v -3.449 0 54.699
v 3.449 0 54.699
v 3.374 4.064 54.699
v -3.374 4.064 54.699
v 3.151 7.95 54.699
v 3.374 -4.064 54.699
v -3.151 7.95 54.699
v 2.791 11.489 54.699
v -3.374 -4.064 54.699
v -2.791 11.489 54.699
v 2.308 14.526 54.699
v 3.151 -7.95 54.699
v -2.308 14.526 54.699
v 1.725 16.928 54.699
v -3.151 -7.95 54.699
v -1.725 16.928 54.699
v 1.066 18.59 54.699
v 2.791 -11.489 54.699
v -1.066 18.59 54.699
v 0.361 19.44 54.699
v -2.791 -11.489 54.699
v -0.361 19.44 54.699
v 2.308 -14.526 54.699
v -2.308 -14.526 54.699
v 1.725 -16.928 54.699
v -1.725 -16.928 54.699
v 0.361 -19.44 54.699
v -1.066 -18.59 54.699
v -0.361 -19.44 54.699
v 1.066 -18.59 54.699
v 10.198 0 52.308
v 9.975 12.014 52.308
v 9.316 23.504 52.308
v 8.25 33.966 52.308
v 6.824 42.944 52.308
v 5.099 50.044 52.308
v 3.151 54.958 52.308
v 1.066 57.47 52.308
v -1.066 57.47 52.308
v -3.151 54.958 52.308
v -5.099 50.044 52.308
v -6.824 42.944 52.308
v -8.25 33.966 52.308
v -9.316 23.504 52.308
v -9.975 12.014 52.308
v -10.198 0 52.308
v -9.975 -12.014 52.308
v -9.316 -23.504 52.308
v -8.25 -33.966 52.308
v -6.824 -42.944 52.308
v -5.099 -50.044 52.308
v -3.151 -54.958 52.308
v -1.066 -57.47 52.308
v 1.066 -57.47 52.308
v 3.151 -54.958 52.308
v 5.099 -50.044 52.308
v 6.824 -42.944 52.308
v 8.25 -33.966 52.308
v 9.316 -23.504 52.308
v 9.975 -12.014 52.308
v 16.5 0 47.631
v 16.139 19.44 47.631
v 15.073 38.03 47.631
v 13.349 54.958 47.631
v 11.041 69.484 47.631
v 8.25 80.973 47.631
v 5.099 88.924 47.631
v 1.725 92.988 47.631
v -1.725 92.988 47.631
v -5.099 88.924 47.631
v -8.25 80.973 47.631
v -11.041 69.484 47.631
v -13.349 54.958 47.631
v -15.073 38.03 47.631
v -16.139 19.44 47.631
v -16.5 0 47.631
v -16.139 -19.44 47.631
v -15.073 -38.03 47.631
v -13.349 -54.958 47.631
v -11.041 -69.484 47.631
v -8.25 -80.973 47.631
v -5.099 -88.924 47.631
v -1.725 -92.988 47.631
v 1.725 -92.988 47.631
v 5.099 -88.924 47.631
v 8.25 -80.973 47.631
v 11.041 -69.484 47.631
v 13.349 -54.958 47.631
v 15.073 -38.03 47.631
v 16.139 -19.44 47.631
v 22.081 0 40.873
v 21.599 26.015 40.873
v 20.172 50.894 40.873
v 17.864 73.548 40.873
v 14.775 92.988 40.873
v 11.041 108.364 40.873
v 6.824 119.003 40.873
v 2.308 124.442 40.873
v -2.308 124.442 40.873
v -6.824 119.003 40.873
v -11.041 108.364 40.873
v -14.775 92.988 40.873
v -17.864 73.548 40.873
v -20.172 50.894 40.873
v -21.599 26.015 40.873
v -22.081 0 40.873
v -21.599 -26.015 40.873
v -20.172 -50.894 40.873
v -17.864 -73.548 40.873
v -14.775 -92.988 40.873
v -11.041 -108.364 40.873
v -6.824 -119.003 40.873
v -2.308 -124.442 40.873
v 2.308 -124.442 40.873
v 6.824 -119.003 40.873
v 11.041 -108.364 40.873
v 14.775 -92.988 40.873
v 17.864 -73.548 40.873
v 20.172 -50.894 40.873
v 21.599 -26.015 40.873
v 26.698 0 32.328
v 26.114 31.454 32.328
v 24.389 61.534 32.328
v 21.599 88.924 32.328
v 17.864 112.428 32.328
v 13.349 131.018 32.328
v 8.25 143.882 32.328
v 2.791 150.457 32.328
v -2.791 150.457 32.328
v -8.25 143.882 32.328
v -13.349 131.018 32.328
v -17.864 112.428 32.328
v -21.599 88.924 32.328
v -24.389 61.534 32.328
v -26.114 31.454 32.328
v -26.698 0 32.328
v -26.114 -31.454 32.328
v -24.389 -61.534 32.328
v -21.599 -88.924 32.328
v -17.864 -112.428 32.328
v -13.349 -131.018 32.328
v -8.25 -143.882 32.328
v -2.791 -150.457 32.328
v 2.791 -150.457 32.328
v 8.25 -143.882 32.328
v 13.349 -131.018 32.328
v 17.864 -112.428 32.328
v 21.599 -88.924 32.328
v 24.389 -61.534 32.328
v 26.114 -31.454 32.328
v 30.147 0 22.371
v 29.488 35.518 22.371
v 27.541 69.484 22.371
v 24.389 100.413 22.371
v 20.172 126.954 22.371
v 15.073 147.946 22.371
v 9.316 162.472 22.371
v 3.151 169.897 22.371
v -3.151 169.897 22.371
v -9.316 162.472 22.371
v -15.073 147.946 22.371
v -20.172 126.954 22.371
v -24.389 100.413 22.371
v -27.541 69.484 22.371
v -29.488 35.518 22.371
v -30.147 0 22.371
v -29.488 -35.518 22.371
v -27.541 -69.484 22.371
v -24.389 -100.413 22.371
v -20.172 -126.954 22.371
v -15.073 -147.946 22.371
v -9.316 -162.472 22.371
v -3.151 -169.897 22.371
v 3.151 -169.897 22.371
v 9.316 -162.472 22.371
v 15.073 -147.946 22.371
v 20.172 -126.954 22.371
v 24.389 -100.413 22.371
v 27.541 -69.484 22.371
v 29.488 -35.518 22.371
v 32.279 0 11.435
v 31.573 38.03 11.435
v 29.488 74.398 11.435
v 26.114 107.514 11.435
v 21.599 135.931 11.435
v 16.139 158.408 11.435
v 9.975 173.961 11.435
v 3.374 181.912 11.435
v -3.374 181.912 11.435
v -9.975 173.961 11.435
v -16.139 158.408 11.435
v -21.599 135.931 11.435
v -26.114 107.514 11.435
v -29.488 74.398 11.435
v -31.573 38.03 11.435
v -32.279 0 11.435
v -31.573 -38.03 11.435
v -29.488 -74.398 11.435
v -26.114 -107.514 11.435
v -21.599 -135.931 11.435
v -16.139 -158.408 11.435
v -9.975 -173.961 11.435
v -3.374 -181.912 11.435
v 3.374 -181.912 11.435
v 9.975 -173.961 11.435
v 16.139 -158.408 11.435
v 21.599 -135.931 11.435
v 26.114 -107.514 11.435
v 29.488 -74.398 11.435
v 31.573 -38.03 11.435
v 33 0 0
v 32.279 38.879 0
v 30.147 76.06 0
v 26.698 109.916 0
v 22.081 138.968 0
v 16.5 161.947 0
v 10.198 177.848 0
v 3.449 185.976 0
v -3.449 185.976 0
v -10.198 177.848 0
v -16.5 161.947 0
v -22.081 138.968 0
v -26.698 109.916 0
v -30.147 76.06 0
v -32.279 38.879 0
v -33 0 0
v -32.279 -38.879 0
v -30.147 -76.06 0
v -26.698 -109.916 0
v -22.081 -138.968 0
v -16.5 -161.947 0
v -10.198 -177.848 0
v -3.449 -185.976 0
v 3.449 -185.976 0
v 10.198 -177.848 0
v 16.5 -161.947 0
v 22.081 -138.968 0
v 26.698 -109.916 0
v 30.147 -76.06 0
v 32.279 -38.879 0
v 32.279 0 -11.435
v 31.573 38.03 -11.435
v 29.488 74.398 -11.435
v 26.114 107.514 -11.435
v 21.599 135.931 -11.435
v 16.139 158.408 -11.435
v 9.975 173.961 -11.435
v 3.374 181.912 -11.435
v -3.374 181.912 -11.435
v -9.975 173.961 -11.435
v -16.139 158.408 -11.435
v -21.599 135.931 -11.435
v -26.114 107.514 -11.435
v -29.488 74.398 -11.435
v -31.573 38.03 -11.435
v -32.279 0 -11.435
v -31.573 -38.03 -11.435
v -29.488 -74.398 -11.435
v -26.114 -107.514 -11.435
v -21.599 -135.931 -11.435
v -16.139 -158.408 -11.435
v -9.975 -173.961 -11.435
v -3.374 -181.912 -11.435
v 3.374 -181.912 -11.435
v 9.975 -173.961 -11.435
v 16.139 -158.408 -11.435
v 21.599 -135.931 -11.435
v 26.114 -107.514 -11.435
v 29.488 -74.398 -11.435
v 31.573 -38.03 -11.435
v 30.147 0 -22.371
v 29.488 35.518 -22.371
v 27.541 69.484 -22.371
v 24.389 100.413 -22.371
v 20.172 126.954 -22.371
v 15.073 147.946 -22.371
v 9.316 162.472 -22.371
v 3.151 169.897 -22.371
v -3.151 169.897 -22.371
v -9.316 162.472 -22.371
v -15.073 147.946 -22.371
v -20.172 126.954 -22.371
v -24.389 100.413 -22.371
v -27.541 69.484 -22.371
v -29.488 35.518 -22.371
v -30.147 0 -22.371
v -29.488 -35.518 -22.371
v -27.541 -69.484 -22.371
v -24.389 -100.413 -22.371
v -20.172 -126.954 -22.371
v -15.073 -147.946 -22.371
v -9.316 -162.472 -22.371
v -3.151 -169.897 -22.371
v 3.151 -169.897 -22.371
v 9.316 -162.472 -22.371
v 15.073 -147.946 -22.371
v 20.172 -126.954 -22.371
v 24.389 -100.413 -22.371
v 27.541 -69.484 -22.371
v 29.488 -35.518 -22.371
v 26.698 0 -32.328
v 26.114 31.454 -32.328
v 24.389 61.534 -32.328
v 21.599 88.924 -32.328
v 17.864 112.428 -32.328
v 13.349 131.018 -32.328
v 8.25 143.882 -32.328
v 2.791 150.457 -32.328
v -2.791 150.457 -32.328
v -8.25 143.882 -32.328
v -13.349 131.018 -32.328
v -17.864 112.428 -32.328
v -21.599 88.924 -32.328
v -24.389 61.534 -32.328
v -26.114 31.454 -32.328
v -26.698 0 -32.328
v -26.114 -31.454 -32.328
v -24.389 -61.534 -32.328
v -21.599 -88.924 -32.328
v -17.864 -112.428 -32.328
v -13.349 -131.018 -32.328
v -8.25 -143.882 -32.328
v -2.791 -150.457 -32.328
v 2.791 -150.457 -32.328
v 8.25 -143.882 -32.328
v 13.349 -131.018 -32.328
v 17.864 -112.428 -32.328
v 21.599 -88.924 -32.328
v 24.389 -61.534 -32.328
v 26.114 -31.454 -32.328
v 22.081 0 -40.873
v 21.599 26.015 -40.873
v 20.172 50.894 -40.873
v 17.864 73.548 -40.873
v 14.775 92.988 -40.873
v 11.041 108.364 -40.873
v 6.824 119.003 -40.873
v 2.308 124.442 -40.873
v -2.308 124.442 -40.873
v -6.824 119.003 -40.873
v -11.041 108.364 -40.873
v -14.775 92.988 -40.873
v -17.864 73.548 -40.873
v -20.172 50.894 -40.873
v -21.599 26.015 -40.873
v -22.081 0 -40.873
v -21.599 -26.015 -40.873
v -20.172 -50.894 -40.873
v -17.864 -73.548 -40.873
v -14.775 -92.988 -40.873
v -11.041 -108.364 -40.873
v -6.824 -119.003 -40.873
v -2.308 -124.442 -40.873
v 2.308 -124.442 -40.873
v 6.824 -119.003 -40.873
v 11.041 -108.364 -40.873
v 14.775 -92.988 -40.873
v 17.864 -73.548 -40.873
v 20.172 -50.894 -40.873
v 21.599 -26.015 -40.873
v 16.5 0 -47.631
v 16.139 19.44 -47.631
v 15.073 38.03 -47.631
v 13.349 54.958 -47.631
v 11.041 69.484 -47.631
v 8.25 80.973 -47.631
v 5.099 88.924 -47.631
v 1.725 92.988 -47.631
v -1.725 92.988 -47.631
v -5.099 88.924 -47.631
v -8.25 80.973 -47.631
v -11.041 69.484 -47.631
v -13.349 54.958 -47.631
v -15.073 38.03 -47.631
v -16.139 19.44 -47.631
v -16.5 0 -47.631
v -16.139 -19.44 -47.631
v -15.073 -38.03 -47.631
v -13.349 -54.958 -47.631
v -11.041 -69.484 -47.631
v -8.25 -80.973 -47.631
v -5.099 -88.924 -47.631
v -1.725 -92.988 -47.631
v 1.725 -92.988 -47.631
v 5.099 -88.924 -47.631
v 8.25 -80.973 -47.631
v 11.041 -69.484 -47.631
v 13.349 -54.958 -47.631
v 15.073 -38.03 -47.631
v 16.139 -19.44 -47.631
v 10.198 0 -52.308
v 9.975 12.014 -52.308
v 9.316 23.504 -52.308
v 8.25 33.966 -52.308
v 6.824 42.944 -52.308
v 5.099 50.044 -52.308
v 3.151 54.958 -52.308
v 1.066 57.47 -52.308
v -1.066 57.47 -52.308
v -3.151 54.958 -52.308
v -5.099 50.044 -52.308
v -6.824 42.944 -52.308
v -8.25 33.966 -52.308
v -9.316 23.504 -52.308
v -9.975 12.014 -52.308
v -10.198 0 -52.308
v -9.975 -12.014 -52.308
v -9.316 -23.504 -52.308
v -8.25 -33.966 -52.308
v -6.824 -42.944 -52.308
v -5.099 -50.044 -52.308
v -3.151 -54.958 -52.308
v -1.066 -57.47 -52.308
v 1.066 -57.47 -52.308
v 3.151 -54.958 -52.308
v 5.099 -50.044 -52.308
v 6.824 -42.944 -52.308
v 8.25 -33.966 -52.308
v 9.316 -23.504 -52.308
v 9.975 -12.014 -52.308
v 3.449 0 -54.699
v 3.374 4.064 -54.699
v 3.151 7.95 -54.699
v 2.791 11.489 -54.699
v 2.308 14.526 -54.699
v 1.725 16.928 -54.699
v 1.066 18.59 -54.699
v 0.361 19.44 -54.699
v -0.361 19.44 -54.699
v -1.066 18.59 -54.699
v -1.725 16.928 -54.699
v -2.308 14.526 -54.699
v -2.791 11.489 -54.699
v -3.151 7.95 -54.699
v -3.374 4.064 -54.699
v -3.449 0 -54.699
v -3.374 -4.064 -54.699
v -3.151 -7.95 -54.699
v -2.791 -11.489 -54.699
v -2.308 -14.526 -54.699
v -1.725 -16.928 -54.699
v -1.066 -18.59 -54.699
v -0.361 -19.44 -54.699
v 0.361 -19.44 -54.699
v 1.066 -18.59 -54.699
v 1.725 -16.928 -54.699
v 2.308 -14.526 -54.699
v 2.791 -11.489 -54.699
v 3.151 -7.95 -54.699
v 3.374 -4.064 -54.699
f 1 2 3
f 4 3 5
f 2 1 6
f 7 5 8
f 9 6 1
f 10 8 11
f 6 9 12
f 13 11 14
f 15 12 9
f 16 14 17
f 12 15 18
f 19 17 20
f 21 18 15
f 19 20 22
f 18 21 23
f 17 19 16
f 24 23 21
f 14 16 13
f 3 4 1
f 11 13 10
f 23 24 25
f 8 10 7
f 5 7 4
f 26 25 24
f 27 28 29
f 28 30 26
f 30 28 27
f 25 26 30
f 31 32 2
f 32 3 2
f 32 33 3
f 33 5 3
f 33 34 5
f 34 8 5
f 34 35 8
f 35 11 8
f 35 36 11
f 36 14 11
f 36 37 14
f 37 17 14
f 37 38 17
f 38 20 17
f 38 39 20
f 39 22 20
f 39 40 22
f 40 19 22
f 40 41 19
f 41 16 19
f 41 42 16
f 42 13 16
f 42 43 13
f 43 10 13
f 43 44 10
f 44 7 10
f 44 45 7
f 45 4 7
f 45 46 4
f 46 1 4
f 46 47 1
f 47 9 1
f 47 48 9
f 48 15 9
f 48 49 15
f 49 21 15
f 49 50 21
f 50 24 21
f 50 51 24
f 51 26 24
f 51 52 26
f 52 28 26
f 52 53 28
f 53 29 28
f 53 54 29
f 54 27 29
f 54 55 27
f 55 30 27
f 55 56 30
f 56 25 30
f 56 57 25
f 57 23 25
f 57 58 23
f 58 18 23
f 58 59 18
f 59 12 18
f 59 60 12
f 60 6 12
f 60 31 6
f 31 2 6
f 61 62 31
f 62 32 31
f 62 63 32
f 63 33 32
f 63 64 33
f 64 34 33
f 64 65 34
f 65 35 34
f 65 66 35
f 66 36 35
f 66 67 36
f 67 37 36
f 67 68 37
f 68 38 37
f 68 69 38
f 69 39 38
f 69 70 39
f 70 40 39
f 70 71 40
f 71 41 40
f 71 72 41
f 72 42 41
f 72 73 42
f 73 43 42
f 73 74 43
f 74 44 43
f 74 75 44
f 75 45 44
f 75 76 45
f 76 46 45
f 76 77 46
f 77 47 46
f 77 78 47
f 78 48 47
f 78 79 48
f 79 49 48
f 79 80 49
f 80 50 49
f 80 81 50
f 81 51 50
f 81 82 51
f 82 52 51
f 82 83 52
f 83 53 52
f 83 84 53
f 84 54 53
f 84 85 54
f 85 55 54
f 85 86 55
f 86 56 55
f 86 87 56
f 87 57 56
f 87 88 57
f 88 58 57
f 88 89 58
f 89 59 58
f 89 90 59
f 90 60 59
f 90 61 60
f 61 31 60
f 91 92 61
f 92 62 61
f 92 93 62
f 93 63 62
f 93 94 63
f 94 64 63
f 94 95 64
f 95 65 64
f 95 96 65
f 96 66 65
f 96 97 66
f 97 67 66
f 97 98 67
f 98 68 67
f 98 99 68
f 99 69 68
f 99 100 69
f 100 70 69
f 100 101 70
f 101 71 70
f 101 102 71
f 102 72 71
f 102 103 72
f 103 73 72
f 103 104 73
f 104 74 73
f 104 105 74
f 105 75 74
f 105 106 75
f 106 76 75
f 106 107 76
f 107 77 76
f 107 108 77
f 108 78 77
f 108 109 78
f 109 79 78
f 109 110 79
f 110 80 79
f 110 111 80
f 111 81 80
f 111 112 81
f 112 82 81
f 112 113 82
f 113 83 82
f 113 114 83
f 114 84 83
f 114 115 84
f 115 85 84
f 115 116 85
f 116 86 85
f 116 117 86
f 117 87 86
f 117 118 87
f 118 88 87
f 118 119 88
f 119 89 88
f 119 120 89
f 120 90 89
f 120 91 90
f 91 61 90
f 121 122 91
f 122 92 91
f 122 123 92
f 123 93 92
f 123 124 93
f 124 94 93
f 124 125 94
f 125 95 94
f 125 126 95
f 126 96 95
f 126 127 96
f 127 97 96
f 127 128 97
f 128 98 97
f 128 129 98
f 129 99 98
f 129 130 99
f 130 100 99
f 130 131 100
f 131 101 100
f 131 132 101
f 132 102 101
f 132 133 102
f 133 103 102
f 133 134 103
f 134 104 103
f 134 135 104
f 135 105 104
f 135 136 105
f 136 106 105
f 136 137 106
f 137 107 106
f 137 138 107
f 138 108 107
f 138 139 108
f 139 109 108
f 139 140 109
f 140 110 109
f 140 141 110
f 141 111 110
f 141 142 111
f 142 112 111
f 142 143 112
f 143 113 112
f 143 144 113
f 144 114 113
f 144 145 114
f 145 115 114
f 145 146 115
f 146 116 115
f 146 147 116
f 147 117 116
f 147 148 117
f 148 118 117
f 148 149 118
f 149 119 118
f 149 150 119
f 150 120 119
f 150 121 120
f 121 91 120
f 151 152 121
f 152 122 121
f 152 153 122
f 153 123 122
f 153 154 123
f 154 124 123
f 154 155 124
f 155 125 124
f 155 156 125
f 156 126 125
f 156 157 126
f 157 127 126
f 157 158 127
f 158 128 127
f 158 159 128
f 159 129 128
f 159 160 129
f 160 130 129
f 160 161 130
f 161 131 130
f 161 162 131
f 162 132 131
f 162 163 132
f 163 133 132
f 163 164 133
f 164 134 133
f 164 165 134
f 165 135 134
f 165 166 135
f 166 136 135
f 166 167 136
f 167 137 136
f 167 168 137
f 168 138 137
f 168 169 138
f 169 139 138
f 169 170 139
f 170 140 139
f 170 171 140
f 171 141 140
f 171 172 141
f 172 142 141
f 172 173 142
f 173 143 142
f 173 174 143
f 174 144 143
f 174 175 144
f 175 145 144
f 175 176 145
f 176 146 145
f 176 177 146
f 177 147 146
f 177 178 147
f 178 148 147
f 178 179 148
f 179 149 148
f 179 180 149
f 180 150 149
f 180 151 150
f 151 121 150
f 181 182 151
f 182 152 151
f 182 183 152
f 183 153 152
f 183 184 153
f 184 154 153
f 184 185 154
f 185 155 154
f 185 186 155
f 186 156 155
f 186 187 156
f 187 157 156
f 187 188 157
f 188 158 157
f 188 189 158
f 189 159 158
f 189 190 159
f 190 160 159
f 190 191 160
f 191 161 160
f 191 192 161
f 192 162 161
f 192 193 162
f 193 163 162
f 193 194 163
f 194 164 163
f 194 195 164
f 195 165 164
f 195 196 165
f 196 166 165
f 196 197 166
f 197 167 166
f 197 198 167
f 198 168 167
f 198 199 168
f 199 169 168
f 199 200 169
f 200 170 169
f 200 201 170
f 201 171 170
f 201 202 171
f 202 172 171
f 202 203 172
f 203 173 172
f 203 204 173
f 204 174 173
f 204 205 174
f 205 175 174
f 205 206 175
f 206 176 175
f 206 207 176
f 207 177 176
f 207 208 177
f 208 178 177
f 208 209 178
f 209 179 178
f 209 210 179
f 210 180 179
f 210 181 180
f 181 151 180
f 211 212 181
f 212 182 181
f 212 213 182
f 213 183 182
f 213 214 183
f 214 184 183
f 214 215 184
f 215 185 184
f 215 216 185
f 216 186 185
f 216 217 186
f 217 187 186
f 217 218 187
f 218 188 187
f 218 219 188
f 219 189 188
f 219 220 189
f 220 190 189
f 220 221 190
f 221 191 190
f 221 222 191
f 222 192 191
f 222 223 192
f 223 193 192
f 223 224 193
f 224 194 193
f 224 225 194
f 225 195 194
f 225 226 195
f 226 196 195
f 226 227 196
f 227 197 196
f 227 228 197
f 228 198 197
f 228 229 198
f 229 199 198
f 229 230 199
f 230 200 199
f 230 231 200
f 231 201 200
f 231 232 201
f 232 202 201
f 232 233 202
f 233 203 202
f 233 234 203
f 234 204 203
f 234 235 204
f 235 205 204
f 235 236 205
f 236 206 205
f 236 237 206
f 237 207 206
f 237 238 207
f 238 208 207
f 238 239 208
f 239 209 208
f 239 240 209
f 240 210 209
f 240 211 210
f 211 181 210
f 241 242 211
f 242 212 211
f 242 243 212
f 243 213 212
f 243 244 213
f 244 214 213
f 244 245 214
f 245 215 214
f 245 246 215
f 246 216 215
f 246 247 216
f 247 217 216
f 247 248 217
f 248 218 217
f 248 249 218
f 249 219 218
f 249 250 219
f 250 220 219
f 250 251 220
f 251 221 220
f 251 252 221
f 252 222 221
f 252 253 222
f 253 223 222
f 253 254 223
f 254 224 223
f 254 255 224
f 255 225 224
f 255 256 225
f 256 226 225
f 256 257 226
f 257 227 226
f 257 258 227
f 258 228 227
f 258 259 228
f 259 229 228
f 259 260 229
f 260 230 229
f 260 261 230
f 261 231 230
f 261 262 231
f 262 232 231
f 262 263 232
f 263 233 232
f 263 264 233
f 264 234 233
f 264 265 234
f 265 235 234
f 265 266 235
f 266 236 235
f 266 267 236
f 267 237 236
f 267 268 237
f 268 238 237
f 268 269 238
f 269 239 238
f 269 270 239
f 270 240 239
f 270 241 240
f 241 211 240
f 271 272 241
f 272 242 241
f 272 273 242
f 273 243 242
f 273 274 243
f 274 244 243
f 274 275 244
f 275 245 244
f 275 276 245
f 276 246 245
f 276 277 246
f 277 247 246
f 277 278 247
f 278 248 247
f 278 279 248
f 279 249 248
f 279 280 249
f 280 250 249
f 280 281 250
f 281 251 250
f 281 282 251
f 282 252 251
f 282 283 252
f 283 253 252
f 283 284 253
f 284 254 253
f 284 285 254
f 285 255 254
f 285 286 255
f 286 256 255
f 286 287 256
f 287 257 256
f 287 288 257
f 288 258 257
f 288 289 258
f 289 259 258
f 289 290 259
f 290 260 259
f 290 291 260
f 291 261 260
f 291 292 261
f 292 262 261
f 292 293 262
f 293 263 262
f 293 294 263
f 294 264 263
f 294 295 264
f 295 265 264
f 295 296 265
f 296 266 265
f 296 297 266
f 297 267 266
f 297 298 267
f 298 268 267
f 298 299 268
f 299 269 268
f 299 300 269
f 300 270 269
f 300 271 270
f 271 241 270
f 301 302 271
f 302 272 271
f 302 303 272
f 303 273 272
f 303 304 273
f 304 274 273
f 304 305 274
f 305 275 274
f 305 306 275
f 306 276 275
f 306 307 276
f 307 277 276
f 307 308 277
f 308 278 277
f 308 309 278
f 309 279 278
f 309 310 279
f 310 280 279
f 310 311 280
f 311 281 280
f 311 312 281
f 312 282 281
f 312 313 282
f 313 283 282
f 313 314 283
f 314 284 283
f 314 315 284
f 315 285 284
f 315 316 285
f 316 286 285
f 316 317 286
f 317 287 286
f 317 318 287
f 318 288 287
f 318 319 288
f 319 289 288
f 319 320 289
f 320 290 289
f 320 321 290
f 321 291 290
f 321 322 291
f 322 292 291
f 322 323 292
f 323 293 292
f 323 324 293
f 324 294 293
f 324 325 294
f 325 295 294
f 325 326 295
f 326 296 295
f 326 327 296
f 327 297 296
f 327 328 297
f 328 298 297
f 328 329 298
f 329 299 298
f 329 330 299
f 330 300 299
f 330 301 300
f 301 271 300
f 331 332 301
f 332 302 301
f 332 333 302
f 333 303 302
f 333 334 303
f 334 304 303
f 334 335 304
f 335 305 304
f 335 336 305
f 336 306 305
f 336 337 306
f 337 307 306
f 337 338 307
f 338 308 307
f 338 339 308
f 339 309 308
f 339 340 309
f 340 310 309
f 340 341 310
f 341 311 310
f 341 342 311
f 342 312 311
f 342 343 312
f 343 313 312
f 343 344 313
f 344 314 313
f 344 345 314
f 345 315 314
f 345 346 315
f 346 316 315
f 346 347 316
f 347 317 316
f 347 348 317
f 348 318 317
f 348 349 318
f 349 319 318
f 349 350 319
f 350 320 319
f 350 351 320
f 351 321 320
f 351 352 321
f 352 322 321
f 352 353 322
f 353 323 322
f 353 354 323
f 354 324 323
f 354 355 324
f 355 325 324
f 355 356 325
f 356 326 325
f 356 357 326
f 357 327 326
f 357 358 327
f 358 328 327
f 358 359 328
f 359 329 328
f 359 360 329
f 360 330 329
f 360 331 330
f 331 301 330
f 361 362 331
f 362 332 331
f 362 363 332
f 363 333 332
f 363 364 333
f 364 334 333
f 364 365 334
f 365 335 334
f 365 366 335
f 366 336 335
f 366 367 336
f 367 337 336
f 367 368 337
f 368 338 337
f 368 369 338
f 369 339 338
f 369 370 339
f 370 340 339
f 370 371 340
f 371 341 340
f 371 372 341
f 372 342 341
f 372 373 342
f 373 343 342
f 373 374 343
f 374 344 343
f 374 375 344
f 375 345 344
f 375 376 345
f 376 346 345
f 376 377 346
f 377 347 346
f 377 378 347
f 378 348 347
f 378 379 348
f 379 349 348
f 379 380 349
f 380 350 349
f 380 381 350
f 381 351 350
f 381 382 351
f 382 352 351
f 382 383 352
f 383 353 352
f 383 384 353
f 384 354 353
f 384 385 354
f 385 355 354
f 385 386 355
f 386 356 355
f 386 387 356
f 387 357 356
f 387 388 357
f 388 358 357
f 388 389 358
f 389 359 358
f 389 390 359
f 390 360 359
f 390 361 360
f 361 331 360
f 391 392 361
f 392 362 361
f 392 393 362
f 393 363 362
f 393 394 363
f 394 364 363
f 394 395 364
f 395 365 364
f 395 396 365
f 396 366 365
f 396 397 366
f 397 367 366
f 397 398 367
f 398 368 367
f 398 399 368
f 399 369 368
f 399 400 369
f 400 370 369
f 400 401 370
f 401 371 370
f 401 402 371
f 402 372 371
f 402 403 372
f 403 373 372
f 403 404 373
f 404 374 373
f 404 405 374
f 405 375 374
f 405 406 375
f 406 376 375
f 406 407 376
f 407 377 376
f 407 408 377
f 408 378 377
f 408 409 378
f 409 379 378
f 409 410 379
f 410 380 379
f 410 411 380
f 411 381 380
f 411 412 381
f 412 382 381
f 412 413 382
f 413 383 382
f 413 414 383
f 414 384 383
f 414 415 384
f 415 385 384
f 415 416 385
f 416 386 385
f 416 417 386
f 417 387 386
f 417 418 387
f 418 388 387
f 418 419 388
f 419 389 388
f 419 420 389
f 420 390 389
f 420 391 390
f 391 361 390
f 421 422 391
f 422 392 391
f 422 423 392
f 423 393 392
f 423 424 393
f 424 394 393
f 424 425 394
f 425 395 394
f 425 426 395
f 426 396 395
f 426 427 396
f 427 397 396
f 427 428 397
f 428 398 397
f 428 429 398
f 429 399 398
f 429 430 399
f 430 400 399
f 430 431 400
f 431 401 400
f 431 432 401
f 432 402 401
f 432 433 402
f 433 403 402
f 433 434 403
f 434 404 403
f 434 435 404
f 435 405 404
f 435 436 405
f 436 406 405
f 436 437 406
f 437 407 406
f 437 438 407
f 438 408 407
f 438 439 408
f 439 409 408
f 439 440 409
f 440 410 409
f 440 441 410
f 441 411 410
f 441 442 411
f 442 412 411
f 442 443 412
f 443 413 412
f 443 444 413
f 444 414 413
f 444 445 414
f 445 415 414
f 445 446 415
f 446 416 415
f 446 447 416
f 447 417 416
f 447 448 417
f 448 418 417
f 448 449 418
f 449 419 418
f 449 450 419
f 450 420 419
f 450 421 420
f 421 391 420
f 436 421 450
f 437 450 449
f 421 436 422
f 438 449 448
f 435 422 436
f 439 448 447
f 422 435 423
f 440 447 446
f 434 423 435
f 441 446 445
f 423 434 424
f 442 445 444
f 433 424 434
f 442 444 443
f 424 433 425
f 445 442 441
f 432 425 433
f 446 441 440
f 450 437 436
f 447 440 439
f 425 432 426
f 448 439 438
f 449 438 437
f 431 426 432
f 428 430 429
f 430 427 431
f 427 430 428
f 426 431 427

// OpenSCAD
// Generated by SolidPython 1.0.1 on 2020-07-29 00:46:45


scale(v = [3, 17, 5]) {
	sphere(r = 11);
}
/***********************************************
*********      SolidPython code:      **********
************************************************
 
# import packages: SolidPython
from solid import *
from solid.utils import *
from itertools import chain, combinations, permutations


class Resize:

    def __init__(self, scad_file):
        self.scad_file = scad_file
        #self.scad_file = import_scad(scad_file)
        # cone/cylinder param:
        self.r1 = 0
        self.r2 = 0
        self.h = 0
        # rectangular prism param:
        self.w = 0
        self.l = 0
        # ellipse param:
        self.r = 0

    # import OpenScad code (file name corresponds to shape)


    # classify shape + parameters
    def assign(self, param1, param2, param3):
        if self.scad_file == 'cone.scad':
            self.r1 = param1
            self.r2 = param2
            self.h = param3
        elif self.scad_file == 'cylinder.scad':
            self.r1 = param1
            self.r2 = param2
            self.h = param3
        elif self.scad_file == 'rectangularPrism.scad':
            self.h = param1
            self.l = param2
            self.w = param3
        else:
            self.r = param1
            self.h = param2

    # resize parameters
    def iterate(self):
        x = range(3, 20, 2)
        i = 1
        if self.scad_file == 'cone.scad':
            tempList = list(permutations(x, 2))
            for temp in tempList:
                param1 = temp[0]
                param2 = temp[1]
                filepath = 'produced_scad_files/' + 'cone' + str(param1) + '_' + str(param2) + '_' + '.scad'
                scad_render_to_file(cylinder(h=param1, r1=param2, r2=0), filepath)

        elif self.scad_file == 'cylinder.scad':
            tempList = list(permutations(x, 3))
            for temp in tempList:
                param1 = temp[0]
                param2 = temp[1]
                filepath = 'produced_scad_files/' + 'cylinder' + str(param1) + '_' + str(param2) + '_' + '.scad'
                scad_render_to_file(cylinder(h=param1, r1=param2, r2=param2), filepath)

        elif self.scad_file == 'rectangularPrism.scad':
            tempList = list(permutations(x, 3))
            for temp in tempList:
                param1 = temp[0]
                param2 = temp[1]
                param3 = temp[2]
                filepath = 'produced_scad_files/' + 'rectangularPrism' + str(param1) + '_' + str(param2) + '_' + str(
                    param3) + '.scad'
                scad_render_to_file(cube(size=(param1, param2, param3)), filepath)

        elif self.scad_file == 'ellipse.scad':
            tempList = list(permutations(x, 4))
            for temp in tempList:
                param1 = temp[0]
                param2 = temp[1]
                param3 = temp[2]
                param4 = temp[3]
                filepath = 'produced_scad_files/' + 'ellipse' + str(param1) + '_' + str(param2) + '_' + str(param3) + '_' + str(param4) + '.scad'
                scad_render_to_file(scale([param1, param2, param3])(sphere(r=param4)), filepath)

    def render_to_scadfile(self):
        scad_render_to_file(scad, 'example.scad') 
 
************************************************/
